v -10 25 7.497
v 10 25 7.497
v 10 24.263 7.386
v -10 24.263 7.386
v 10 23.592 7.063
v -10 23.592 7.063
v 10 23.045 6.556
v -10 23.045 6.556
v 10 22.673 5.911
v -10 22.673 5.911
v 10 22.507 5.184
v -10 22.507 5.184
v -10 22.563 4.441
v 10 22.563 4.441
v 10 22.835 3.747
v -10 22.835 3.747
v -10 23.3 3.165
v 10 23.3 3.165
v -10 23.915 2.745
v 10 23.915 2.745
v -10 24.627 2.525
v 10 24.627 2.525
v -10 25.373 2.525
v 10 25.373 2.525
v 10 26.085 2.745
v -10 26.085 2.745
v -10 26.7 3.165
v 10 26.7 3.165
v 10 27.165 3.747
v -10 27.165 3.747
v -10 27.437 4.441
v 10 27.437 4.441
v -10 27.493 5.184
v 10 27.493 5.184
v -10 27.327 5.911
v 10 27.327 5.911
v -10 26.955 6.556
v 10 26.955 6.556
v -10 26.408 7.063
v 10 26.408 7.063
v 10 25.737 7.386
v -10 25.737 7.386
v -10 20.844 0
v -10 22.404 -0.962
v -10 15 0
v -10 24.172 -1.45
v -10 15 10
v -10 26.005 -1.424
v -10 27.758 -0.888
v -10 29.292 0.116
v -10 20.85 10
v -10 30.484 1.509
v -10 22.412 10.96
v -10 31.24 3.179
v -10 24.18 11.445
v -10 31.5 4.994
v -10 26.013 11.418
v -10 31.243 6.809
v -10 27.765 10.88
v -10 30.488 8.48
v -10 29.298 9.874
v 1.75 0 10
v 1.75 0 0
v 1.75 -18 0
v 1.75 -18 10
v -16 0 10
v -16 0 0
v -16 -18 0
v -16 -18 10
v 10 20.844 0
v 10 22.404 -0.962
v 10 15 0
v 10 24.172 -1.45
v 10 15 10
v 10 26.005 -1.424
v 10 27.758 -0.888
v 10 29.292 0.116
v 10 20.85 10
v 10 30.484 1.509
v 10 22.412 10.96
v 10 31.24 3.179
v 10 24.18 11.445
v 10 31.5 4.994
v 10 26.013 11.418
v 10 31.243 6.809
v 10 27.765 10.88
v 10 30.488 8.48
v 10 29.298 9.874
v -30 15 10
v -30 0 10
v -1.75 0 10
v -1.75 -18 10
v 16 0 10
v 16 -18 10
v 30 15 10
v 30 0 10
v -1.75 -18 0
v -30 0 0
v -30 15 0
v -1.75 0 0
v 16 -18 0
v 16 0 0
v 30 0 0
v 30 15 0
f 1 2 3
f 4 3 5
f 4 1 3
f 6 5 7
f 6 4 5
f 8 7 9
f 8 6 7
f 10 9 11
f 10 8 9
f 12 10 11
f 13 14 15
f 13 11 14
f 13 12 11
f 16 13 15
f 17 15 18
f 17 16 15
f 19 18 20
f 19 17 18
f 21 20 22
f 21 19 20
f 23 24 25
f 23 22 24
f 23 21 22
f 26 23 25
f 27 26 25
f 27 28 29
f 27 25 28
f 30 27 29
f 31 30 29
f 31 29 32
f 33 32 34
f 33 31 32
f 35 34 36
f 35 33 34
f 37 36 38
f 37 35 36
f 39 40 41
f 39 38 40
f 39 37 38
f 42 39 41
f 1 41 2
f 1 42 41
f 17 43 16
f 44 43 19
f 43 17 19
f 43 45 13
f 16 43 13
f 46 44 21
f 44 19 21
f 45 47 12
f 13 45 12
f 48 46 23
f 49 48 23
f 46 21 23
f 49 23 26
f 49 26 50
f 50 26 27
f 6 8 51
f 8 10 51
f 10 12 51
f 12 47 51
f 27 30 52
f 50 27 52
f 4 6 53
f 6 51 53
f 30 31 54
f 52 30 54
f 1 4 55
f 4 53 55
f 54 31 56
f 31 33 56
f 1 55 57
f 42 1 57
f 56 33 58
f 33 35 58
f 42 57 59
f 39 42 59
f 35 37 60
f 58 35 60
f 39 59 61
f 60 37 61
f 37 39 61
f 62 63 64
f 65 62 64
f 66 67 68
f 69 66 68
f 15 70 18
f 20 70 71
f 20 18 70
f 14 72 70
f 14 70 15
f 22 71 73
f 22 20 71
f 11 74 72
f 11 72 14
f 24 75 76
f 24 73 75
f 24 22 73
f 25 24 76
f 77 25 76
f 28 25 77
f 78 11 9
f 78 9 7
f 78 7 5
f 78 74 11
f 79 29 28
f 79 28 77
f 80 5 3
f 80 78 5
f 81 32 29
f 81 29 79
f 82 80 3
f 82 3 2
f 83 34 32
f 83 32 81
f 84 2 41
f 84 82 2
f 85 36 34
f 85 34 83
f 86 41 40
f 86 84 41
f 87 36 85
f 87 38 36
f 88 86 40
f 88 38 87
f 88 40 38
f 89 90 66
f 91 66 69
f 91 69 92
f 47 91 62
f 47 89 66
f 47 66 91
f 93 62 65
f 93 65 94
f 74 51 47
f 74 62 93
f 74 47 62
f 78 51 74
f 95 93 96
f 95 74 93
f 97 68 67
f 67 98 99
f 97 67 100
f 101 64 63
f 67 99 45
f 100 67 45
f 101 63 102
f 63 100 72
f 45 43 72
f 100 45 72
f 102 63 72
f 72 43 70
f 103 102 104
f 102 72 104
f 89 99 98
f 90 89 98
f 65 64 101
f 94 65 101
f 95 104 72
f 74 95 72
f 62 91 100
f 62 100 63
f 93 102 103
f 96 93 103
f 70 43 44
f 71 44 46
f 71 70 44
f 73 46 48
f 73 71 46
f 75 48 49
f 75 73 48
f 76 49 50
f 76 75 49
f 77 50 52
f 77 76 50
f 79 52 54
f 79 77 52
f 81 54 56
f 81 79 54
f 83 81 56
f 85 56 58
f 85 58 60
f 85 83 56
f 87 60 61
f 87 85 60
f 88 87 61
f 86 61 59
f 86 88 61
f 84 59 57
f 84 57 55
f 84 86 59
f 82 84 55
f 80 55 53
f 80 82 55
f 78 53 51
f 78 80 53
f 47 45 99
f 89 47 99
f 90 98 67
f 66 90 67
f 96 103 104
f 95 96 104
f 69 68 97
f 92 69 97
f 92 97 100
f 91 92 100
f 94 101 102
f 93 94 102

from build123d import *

# Parameters (mm, degrees)
F1_DEPTH = 10
F2_R     = 6.5
F2_R_2   = 2.5
F3_DEPTH = 10
F4_DEPTH = 12.5


with BuildPart() as f1:
    # F0 (on Top) → F1 (new body)
    with BuildSketch(Plane.XY):
        Polygon((-30, 15), (-30, 0), (-16, 0), (-16, -18), (-1.75, -18), (-1.75, 0), (0, 0), (1.75, 0), (1.75, -18), (16, -18), (16, 0), (30, 0), (30, 15), (10, 15), (10, 25), (0, 25), (-10, 25), (-10, 15), align=None)
    extrude(amount=F1_DEPTH)

    # F2 (on Right) → F3 (join, symmetric)
    with BuildSketch(Plane.YZ):
        with Locations((24.9999996855, 4.9974920324)):
            Circle(F2_R)
        with Locations((24.9999996855, 4.9974920324)):
            Circle(F2_R_2, mode=Mode.SUBTRACT)
    extrude(amount=F3_DEPTH, both=True)

    # F2 (on Right) → F4 (cut, symmetric)
    with BuildSketch(Plane.YZ):
        with Locations((24.9999996855, 4.9974920324)):
            Circle(F2_R_2)
    extrude(amount=F4_DEPTH, both=True, mode=Mode.SUBTRACT)


solid = f1.part
